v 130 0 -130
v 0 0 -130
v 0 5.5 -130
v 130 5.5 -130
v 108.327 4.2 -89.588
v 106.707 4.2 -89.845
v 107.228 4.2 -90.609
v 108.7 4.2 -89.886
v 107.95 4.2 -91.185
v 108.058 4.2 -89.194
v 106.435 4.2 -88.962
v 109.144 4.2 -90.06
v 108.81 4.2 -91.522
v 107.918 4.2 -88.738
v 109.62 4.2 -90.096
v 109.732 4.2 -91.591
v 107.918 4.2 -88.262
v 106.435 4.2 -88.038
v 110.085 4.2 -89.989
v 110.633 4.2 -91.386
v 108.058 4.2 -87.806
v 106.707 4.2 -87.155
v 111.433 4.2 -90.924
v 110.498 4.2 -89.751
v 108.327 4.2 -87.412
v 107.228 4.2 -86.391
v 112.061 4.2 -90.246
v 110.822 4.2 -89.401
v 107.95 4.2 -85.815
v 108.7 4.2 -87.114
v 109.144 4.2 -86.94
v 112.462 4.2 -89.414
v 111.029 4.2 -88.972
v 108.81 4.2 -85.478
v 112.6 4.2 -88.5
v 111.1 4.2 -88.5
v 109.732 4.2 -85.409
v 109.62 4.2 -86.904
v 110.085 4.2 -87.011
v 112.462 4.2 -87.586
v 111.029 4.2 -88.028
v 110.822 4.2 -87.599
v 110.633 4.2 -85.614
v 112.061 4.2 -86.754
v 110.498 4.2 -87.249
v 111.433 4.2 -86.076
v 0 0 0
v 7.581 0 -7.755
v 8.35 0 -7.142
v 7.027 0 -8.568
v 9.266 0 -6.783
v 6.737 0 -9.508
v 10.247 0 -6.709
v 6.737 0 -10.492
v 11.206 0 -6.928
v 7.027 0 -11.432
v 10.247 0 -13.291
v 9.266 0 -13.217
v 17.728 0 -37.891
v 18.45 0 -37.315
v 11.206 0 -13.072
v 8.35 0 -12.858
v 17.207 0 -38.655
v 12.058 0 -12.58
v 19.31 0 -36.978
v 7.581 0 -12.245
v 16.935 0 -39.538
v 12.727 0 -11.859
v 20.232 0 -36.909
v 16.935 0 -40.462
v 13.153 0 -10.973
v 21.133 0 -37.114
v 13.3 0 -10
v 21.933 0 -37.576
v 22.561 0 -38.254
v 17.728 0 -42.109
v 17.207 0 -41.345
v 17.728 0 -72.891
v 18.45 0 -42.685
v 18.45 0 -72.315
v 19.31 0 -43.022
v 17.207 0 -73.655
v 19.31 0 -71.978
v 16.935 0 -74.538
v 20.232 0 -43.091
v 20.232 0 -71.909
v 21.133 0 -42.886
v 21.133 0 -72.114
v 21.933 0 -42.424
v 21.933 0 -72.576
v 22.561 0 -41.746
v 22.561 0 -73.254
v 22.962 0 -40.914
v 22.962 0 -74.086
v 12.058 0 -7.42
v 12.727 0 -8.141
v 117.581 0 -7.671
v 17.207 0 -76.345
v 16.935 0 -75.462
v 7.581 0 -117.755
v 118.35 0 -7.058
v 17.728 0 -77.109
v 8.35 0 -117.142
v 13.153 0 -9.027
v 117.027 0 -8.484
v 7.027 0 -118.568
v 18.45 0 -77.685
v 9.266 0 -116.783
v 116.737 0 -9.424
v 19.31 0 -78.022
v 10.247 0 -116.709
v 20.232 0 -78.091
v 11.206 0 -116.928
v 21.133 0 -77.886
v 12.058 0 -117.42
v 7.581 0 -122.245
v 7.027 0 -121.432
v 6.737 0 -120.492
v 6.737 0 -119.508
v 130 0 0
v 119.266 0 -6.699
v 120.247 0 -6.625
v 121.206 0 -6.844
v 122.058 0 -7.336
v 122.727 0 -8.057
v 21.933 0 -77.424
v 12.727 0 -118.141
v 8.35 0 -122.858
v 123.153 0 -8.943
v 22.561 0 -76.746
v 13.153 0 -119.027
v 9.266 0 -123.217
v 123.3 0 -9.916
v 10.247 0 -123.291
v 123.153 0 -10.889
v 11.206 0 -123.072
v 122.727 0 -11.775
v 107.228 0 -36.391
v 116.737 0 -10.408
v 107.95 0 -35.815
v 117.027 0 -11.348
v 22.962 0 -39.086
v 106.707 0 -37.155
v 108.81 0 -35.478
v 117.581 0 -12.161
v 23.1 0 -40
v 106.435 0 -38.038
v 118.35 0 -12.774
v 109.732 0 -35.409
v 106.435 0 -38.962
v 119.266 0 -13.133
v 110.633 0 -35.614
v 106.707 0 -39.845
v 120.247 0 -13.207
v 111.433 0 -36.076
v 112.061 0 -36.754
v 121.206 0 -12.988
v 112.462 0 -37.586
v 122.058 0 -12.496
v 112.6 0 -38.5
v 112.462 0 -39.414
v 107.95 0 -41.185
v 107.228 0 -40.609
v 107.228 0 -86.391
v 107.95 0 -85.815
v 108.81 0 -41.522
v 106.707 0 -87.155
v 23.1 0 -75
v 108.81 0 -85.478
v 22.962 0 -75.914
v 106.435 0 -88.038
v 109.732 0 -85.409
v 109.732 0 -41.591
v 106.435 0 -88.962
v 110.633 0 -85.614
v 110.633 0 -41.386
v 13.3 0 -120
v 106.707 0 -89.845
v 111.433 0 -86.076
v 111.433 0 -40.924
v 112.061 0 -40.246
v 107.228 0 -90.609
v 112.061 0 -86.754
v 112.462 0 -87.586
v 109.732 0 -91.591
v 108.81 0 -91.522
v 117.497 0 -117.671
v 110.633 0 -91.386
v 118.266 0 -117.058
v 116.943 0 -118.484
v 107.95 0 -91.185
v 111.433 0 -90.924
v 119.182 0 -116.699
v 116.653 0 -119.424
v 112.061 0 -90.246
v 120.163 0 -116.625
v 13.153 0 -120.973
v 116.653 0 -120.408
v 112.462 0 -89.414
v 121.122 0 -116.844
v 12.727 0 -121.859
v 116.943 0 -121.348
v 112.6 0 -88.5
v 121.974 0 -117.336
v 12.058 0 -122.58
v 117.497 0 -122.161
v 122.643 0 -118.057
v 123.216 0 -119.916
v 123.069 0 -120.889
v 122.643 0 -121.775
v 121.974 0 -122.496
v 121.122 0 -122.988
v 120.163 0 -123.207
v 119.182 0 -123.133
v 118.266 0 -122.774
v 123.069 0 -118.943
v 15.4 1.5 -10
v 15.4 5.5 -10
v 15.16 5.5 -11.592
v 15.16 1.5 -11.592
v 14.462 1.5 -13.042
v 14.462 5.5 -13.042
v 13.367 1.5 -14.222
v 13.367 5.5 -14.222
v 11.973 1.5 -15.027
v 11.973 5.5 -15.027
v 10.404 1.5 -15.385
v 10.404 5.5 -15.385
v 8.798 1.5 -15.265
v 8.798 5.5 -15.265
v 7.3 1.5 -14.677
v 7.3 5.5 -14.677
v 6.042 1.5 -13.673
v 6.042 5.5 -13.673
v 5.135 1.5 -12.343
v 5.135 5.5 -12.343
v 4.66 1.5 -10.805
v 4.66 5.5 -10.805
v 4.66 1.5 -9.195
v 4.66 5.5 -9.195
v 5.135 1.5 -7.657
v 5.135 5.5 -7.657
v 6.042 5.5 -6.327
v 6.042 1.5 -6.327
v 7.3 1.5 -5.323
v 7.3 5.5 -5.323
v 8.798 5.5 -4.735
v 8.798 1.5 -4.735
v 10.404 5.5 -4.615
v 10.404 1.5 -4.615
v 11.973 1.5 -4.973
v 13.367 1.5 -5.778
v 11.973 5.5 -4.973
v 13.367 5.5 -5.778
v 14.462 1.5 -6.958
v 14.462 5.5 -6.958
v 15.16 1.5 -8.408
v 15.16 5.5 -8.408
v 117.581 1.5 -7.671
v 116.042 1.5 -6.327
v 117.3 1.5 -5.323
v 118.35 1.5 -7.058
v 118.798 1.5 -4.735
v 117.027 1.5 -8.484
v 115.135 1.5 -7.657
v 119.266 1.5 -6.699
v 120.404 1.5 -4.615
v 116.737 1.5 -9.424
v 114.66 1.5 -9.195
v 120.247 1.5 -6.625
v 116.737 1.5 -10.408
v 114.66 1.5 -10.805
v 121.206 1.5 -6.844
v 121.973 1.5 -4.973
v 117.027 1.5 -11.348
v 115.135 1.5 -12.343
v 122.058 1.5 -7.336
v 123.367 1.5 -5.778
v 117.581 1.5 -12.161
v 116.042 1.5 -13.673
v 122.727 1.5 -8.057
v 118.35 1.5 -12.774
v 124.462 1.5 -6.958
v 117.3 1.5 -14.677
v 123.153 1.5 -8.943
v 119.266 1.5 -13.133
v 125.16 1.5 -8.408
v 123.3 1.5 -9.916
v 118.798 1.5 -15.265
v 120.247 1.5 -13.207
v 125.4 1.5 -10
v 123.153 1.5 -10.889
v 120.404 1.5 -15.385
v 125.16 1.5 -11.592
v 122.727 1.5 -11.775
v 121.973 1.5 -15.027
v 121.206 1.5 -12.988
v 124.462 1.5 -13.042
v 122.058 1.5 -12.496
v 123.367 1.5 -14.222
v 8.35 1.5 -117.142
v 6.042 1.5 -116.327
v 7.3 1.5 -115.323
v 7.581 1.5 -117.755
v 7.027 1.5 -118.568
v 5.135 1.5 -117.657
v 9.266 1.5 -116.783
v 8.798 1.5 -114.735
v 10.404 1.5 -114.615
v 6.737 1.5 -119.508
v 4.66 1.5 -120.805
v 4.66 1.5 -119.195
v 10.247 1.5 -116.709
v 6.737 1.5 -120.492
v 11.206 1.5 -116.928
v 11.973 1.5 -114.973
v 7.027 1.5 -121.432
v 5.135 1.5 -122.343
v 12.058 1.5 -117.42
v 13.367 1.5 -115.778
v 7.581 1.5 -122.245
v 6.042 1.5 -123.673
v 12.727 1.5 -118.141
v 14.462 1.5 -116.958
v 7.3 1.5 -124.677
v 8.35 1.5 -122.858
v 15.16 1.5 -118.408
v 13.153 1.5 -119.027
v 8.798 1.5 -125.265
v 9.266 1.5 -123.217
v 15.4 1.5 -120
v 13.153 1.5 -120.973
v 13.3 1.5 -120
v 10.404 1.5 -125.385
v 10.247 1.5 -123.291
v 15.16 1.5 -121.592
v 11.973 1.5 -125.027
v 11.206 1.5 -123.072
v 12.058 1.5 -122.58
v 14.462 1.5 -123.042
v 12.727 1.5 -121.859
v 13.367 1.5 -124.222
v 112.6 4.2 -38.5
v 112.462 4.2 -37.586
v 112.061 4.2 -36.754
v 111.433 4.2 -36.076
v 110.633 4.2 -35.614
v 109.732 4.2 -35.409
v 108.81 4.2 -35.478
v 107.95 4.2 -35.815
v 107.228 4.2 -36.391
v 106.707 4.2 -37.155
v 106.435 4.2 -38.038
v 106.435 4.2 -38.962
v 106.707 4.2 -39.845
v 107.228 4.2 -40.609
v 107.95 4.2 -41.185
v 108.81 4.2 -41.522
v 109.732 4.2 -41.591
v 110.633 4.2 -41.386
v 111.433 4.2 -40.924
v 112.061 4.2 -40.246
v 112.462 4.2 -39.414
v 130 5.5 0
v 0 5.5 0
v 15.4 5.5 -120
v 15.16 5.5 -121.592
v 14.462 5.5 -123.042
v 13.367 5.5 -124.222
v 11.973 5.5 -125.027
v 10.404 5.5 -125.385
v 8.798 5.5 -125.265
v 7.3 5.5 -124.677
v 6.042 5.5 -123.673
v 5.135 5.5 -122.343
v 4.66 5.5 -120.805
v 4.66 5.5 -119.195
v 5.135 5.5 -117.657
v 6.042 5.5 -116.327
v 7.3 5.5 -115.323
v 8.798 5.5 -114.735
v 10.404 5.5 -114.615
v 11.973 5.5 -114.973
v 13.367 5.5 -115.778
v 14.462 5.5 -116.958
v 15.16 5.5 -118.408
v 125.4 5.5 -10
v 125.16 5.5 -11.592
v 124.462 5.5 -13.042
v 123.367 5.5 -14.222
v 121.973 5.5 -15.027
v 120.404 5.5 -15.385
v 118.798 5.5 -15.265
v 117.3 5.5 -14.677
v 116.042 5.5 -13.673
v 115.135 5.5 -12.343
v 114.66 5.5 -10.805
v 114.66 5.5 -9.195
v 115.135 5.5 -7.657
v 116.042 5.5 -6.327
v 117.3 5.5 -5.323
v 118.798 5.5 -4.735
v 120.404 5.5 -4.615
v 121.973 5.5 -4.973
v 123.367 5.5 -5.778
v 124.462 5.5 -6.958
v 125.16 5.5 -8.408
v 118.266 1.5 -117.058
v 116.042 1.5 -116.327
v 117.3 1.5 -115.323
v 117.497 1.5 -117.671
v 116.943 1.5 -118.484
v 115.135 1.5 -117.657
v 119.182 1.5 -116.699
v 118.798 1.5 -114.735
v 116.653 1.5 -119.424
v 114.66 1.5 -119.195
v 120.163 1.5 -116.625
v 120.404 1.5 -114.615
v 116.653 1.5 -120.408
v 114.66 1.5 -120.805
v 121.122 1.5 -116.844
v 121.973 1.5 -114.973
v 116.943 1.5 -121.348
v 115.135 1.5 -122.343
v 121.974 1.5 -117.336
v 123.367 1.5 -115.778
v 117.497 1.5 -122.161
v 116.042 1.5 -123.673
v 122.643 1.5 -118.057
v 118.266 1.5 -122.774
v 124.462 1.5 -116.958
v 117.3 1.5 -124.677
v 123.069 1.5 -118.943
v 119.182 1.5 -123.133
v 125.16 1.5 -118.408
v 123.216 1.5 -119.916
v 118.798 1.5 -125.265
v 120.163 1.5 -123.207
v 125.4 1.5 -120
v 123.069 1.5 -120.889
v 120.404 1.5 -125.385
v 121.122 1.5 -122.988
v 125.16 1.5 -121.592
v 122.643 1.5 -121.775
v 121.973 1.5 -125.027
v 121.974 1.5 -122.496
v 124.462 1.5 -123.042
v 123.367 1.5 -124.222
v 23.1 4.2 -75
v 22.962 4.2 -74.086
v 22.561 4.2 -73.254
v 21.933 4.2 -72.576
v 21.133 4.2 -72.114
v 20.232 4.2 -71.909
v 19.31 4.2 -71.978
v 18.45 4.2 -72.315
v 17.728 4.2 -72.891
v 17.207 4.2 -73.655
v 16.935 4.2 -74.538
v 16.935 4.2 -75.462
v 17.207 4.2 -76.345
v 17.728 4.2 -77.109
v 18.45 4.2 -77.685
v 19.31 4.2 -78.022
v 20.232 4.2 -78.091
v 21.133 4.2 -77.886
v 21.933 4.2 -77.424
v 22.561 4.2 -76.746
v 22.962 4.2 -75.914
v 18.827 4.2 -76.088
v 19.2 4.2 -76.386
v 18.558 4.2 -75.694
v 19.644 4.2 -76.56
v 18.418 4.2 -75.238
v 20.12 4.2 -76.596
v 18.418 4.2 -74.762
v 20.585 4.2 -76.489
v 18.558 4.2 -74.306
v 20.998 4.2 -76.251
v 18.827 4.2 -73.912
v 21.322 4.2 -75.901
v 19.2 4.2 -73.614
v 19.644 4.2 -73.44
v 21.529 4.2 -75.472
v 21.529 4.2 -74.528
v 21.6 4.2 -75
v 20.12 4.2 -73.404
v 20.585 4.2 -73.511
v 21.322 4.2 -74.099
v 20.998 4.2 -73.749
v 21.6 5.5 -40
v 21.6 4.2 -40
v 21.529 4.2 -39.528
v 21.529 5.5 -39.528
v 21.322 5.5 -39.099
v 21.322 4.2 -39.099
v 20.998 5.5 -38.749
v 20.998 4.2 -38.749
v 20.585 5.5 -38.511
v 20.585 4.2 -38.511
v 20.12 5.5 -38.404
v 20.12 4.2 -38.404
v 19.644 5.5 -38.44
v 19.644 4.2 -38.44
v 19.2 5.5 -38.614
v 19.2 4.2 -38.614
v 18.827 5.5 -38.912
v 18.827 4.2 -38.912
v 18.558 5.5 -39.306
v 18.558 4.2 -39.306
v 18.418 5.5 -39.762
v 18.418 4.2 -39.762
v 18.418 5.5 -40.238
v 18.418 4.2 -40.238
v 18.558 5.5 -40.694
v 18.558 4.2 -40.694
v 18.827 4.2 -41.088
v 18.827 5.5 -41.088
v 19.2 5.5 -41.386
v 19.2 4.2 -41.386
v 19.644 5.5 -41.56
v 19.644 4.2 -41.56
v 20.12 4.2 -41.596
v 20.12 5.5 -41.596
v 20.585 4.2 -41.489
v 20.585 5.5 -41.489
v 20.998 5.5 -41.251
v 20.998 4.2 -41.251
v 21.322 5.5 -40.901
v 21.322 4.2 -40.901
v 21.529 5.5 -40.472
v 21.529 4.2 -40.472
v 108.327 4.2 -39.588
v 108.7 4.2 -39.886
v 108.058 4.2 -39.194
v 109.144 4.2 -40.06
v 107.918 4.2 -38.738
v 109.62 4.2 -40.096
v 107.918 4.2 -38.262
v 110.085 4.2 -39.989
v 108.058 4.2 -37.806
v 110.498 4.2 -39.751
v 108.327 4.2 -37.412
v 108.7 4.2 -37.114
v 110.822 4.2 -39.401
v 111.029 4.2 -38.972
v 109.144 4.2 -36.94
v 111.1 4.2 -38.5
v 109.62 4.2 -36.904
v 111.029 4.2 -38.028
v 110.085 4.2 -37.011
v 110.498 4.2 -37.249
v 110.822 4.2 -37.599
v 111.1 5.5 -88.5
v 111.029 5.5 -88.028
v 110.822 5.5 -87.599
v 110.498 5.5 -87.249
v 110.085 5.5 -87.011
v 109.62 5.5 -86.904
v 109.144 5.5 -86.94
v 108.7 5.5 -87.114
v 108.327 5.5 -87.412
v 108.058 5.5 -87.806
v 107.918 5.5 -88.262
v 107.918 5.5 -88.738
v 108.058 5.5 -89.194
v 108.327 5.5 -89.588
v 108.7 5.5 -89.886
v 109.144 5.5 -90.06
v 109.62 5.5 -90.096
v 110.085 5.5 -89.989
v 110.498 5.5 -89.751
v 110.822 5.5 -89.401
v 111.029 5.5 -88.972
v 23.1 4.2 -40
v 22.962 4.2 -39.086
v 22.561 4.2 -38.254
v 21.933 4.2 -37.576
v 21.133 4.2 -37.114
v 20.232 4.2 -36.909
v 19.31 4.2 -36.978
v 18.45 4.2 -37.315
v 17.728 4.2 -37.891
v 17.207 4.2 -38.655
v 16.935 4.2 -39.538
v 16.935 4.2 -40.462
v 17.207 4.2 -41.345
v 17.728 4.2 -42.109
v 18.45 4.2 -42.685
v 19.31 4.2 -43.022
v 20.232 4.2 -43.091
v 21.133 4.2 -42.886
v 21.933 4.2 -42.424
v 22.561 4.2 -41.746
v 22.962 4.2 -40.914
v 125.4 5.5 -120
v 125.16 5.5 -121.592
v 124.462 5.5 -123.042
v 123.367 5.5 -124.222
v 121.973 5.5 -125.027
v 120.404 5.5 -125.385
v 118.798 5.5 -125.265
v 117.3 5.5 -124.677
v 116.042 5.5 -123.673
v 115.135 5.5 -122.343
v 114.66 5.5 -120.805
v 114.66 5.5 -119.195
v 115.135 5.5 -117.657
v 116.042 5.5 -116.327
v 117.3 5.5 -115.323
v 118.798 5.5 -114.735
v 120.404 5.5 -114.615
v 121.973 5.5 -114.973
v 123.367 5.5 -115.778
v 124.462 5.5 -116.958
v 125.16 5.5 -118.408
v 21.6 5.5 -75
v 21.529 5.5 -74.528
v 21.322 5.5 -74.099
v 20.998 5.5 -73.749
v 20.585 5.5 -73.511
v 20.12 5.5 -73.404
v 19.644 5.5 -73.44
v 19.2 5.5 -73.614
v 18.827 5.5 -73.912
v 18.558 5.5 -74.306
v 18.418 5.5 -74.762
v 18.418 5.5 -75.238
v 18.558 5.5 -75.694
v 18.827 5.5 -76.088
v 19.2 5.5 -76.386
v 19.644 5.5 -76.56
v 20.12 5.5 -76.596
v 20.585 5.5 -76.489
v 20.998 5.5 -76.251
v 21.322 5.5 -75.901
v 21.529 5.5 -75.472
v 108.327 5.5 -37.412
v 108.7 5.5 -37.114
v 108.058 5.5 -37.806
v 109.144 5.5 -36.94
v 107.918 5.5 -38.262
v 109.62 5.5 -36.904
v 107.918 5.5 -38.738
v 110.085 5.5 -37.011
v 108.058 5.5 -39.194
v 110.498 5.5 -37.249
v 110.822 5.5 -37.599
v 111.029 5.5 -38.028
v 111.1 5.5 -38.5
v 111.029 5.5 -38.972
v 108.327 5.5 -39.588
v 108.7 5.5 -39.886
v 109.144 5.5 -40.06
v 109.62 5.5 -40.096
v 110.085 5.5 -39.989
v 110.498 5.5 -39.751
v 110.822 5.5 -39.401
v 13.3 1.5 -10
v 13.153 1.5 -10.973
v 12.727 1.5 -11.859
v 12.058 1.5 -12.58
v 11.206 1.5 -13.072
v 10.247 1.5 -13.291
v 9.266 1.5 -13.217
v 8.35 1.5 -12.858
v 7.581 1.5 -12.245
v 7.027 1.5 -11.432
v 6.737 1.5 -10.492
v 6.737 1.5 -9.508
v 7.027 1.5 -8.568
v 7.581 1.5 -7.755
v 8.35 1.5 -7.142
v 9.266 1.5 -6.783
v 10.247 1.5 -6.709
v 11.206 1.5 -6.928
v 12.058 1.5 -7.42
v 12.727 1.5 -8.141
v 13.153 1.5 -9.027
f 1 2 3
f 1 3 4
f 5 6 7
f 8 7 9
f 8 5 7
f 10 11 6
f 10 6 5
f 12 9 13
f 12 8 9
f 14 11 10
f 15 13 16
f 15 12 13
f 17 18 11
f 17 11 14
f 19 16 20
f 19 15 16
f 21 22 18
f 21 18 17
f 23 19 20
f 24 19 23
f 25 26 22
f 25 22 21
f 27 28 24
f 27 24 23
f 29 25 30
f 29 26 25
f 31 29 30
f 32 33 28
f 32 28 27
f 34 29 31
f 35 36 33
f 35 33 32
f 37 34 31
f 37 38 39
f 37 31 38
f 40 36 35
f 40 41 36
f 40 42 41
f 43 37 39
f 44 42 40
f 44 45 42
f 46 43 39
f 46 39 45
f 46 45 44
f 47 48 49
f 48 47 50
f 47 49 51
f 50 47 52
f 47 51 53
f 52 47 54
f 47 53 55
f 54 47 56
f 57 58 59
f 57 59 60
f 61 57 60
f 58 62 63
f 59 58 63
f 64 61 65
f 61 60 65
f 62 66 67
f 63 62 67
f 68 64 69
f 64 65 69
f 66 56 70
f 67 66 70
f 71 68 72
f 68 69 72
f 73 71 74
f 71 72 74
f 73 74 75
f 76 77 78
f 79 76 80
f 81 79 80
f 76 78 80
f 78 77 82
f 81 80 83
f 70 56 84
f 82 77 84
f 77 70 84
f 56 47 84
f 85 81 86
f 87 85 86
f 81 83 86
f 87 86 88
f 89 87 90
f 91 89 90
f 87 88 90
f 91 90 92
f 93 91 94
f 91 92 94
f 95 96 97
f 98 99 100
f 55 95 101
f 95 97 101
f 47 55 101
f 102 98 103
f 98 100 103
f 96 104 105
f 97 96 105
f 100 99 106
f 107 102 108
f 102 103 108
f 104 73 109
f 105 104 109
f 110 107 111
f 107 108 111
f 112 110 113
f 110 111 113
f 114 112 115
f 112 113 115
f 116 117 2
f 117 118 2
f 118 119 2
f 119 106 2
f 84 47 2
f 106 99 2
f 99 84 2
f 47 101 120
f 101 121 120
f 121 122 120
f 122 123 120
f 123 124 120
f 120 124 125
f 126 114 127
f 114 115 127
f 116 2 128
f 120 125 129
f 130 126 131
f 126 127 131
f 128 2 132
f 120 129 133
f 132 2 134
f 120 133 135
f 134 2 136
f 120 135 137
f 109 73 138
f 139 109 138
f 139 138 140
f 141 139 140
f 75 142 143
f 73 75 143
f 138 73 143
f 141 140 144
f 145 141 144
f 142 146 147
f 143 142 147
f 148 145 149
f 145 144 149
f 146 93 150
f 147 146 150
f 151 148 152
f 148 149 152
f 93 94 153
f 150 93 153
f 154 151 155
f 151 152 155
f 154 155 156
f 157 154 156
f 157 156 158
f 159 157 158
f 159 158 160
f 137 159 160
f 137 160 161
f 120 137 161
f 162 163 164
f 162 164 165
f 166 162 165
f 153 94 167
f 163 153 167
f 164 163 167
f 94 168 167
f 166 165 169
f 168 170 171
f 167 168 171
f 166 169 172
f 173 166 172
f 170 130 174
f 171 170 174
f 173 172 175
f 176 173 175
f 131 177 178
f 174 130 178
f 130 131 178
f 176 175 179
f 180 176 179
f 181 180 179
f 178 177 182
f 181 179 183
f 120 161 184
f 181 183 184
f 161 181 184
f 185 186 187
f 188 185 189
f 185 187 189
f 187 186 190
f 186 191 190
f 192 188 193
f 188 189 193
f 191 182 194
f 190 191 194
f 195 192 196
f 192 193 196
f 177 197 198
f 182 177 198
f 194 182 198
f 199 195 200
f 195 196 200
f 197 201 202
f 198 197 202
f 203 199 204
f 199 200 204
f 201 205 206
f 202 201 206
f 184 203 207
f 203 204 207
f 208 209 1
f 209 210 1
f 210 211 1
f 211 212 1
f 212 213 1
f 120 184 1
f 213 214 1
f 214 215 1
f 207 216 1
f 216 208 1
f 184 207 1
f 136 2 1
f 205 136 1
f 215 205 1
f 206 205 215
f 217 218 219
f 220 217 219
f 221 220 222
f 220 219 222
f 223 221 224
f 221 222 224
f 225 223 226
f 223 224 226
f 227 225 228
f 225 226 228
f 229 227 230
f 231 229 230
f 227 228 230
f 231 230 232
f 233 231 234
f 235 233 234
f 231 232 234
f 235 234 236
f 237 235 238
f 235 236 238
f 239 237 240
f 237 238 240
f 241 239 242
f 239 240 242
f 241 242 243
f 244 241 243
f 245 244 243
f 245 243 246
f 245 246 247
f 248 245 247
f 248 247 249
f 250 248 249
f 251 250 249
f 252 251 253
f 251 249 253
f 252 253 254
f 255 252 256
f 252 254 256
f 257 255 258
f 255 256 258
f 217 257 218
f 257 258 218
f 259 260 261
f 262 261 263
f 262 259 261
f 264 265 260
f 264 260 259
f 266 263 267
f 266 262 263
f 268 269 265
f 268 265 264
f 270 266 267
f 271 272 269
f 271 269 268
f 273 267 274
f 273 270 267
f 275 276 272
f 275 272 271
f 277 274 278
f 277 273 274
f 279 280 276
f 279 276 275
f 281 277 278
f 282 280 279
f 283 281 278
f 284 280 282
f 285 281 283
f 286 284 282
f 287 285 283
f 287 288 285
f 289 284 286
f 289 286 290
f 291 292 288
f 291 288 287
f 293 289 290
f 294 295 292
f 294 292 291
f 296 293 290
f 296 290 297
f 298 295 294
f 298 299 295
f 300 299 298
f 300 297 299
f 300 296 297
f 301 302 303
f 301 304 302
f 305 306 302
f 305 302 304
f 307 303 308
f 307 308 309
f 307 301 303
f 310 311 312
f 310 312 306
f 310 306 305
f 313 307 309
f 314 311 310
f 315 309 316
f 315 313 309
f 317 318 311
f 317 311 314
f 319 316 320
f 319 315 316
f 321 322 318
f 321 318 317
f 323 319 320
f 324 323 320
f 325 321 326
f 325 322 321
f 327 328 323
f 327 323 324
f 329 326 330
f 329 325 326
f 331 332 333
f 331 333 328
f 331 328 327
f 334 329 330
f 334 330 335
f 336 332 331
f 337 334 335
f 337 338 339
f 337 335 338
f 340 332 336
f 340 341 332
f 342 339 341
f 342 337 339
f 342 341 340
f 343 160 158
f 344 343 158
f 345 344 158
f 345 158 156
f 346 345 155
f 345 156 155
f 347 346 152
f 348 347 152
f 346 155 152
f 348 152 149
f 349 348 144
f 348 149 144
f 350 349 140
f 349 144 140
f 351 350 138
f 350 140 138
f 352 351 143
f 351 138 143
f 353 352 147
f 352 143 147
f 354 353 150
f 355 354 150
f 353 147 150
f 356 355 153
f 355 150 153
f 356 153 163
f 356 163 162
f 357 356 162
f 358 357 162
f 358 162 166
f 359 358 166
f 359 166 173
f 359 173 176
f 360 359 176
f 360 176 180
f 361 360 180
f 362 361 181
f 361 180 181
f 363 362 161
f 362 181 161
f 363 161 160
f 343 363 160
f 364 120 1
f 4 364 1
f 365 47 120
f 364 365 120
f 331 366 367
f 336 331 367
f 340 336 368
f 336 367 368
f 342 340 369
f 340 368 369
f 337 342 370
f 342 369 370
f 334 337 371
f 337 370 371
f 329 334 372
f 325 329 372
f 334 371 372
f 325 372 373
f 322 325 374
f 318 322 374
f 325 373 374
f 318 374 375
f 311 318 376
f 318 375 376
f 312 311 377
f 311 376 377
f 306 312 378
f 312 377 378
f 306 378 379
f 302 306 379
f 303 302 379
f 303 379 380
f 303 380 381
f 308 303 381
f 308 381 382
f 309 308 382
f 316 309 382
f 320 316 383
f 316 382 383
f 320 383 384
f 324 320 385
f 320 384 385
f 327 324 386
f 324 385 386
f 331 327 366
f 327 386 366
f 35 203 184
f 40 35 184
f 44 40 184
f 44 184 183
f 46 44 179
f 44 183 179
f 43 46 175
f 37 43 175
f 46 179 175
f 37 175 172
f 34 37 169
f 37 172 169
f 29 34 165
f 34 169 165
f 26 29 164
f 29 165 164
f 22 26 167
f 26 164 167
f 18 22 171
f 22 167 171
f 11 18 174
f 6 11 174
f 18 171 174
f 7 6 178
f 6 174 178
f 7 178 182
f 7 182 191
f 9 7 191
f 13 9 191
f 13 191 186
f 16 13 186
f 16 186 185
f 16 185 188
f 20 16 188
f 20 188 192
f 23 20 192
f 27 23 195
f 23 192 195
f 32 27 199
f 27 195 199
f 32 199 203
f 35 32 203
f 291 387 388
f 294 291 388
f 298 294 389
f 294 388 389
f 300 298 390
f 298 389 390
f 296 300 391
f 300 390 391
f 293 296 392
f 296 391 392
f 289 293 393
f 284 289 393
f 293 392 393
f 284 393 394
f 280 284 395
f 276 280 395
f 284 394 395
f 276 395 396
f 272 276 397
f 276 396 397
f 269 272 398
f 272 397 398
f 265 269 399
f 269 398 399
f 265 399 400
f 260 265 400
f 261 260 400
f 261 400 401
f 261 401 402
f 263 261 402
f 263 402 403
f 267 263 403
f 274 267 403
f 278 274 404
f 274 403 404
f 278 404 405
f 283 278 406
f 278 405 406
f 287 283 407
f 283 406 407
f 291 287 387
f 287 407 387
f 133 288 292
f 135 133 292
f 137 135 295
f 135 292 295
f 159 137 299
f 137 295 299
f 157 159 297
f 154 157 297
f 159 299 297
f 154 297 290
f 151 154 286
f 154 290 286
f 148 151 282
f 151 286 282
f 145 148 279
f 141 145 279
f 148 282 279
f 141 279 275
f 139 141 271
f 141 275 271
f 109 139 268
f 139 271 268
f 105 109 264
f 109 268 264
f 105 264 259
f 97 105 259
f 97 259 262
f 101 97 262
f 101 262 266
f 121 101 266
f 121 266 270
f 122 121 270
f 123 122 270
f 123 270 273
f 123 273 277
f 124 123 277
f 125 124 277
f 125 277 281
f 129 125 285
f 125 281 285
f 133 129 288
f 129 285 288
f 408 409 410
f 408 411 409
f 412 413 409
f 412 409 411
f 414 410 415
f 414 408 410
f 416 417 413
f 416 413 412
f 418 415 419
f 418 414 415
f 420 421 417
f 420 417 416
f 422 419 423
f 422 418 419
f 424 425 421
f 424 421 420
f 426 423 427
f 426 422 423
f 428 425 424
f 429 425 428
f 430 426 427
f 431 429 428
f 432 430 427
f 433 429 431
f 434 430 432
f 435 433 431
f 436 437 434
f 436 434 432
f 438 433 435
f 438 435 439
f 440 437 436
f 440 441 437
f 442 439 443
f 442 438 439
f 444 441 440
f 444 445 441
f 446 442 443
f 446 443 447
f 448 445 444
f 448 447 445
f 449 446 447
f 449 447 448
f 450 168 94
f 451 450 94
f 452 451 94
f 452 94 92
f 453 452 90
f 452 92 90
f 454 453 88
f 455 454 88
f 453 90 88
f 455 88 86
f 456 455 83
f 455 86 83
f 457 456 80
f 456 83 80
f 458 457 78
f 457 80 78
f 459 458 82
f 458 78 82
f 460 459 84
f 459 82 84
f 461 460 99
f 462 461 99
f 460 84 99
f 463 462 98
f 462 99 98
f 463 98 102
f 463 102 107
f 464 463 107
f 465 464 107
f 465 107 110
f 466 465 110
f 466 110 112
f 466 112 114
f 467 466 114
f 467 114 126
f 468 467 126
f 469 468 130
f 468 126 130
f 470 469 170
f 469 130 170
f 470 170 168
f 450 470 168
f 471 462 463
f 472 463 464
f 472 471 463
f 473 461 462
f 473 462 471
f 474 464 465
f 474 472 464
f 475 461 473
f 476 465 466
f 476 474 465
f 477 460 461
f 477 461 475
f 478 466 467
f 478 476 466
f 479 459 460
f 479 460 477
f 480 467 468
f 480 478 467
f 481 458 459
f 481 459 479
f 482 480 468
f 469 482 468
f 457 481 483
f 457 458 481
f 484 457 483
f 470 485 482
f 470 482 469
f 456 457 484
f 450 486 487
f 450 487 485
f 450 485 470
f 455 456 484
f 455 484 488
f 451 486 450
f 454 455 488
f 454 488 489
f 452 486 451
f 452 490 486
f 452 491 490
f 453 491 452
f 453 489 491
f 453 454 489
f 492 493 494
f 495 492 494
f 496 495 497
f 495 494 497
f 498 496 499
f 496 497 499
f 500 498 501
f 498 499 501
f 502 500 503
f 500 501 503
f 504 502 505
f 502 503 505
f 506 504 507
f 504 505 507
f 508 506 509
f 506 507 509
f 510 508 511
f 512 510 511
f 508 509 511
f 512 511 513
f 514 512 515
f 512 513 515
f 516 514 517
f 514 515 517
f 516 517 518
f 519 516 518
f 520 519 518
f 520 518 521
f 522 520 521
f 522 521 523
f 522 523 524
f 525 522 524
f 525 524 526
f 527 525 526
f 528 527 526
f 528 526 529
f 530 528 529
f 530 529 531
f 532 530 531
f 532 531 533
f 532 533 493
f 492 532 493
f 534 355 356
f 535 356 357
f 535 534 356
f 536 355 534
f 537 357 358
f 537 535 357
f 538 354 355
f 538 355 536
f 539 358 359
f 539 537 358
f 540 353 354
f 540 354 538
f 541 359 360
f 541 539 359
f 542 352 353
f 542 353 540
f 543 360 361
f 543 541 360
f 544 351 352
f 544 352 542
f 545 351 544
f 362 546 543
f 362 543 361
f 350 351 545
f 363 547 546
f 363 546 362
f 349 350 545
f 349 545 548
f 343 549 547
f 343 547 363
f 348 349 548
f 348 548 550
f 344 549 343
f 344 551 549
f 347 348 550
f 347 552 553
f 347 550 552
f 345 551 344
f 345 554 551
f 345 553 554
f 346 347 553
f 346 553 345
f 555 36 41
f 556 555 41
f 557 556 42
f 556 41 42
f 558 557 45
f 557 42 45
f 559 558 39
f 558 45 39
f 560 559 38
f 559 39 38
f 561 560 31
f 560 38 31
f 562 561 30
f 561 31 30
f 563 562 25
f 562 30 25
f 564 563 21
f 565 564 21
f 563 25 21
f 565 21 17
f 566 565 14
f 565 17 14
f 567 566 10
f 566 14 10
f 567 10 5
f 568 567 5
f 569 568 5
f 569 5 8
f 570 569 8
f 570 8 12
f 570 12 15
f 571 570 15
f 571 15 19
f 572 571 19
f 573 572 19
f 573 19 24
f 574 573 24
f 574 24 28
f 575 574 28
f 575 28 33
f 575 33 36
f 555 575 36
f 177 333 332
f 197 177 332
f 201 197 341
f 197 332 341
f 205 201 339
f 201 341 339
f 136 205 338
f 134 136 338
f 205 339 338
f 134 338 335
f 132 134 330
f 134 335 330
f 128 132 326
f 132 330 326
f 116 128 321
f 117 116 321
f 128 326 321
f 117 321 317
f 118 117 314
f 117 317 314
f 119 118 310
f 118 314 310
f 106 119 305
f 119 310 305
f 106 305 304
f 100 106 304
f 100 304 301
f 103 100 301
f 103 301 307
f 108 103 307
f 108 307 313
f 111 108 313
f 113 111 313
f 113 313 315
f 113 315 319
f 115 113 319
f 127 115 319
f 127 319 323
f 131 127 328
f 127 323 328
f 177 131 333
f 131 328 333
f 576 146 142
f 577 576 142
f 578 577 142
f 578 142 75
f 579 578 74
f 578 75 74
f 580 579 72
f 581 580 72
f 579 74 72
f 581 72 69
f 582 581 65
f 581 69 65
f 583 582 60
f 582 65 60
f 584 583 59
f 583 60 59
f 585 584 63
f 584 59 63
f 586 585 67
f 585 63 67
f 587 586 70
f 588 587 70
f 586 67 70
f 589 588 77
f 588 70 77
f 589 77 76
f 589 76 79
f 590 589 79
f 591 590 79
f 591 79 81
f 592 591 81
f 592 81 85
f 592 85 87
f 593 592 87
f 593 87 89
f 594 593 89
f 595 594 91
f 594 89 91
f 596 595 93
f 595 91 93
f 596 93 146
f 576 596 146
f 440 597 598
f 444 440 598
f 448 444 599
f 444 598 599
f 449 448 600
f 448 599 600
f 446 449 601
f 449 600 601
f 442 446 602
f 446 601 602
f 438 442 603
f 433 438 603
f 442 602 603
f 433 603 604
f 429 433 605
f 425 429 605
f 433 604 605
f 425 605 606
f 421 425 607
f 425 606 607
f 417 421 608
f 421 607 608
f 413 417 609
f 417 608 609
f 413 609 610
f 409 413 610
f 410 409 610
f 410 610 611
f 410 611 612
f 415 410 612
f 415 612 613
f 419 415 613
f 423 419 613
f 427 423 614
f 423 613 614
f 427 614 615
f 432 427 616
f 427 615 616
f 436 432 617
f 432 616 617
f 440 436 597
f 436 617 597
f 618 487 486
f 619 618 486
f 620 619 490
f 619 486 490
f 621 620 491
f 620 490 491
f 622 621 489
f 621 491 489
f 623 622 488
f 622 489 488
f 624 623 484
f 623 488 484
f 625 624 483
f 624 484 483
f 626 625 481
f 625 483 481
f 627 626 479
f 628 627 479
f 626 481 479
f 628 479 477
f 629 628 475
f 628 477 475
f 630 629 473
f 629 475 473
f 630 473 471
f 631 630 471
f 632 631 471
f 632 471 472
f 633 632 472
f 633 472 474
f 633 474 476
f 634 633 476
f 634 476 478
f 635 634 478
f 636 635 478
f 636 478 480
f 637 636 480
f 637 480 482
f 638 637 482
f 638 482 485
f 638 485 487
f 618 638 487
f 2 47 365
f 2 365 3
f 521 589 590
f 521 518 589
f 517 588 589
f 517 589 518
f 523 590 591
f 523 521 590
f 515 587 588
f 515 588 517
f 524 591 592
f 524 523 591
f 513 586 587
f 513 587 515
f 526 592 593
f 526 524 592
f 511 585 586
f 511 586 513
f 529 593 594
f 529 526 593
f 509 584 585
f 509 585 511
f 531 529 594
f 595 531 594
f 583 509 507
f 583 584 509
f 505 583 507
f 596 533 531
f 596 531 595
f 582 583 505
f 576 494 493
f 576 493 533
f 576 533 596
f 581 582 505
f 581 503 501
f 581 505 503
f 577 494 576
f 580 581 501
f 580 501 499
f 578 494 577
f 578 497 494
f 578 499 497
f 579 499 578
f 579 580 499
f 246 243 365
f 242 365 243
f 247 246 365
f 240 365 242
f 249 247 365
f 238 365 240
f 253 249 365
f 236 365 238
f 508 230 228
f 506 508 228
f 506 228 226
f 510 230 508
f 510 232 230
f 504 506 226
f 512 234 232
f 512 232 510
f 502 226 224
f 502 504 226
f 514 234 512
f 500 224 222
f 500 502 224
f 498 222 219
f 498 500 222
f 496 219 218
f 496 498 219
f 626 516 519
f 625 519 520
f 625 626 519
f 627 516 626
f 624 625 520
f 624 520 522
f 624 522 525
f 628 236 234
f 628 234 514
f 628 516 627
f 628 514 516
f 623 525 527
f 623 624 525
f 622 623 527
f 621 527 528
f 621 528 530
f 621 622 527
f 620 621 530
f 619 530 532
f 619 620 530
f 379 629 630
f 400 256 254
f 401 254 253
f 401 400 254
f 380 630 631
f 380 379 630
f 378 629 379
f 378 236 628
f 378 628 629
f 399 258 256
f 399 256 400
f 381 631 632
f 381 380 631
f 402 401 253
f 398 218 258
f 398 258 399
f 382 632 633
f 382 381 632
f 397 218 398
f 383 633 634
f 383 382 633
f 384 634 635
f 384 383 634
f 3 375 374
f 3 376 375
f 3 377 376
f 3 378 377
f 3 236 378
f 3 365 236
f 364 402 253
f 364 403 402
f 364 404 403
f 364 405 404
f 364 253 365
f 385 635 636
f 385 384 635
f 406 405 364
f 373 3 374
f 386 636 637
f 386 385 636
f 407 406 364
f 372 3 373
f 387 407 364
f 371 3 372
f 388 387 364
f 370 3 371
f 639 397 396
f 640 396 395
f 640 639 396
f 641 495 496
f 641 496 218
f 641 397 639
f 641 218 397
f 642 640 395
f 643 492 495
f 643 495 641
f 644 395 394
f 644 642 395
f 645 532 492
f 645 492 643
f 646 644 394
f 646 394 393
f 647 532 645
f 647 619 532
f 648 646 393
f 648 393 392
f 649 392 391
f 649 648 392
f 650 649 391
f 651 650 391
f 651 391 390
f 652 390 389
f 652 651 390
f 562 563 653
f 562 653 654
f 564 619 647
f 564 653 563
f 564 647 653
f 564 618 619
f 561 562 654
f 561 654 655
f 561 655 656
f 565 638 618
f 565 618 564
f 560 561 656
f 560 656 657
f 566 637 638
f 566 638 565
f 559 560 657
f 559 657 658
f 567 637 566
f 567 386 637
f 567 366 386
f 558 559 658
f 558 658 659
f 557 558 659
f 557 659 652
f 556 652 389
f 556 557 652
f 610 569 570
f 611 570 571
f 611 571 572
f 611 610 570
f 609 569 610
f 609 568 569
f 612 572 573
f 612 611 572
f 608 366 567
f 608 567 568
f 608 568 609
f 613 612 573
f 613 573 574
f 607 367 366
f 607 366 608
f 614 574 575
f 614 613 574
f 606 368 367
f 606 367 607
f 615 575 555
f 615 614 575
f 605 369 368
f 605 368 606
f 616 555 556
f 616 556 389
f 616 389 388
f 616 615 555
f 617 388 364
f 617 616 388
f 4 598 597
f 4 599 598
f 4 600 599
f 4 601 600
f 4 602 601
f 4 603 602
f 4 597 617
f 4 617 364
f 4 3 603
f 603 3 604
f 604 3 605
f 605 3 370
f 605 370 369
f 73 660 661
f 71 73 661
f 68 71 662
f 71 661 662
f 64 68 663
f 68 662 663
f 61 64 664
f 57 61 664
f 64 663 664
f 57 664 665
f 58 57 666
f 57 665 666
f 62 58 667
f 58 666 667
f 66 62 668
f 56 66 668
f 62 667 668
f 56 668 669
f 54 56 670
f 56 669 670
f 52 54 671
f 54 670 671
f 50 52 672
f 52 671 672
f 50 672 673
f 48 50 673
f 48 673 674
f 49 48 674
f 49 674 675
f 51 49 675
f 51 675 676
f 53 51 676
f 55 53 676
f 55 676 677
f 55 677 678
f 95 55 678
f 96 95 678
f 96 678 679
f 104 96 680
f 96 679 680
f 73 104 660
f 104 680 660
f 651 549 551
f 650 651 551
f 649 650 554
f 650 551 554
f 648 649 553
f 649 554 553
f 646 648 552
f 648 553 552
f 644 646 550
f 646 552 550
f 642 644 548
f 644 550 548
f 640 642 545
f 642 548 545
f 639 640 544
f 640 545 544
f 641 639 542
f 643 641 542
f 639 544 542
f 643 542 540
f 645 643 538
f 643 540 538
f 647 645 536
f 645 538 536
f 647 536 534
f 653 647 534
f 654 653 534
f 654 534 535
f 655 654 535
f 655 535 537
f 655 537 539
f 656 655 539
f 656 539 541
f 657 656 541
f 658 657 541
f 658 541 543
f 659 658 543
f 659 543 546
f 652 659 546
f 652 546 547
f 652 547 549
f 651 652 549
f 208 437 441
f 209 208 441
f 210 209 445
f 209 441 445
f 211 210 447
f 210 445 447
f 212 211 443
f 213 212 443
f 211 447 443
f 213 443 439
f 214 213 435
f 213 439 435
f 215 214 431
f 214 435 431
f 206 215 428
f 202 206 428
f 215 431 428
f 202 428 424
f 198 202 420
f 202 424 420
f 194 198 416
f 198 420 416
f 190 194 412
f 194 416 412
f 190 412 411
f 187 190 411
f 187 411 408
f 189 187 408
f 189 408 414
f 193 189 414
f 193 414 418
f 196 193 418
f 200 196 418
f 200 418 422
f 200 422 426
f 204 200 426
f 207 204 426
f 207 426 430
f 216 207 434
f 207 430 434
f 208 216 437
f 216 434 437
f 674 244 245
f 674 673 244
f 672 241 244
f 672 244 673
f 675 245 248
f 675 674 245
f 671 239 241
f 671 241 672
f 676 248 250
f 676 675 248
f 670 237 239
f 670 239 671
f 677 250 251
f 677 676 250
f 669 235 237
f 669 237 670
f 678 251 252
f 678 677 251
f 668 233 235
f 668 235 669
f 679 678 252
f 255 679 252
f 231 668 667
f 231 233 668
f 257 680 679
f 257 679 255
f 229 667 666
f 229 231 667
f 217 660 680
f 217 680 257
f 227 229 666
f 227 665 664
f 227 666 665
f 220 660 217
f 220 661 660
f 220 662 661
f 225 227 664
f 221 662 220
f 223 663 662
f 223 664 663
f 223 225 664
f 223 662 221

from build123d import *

# Parameters (mm, degrees)
SKETCH_1_W           = 130
SKETCH_1_H           = 130
EXTRUDE_1_DEPTH      = 5.5
SKETCH_4_R           = 5.4
CUT_EXTRUDE_7_DEPTH  = 4
SKETCH_6_R           = 3.3
CUT_EXTRUDE_8_DEPTH  = 1.5
SKETCH_7_R           = 3.1
CUT_EXTRUDE_9_DEPTH  = 4.2
SKETCH_8_R           = 1.6
CUT_EXTRUDE_10_DEPTH = 2.3


with BuildPart() as part:
    # 草图1 → 凸台-拉伸1 (new body)
    with BuildSketch(Plane(origin=(0, 0, 0), x_dir=(1, 0, 0), z_dir=(0, 1, 0))):
        with Locations((65, 65)):
            Rectangle(SKETCH_1_W, SKETCH_1_H)
    extrude(amount=EXTRUDE_1_DEPTH)

    # 草图4 → 切除-拉伸7 (cut)
    with BuildSketch(Plane(origin=(0, 5.5, 0), x_dir=(1, 0, 0), z_dir=(0, 1, 0))):
        with Locations((10, 120)):
            Circle(SKETCH_4_R)
        with Locations((120, 120)):
            Circle(SKETCH_4_R)
        with Locations((10, 10)):
            Circle(SKETCH_4_R)
        with Locations((120, 10)):
            Circle(SKETCH_4_R)
    extrude(amount=-CUT_EXTRUDE_7_DEPTH, mode=Mode.SUBTRACT)

    # 草图6 → 切除-拉伸8 (cut)
    with BuildSketch(Plane(origin=(0, 1.5, 0), x_dir=(1, 0, 0), z_dir=(0, 1, 0))):
        with Locations((10, 120)):
            Circle(SKETCH_6_R)
        with Locations((119.916006429, 119.916006429)):
            Circle(SKETCH_6_R)
        with Locations((10, 10)):
            Circle(SKETCH_6_R)
        with Locations((120, 9.916006429)):
            Circle(SKETCH_6_R)
    extrude(amount=-CUT_EXTRUDE_8_DEPTH, mode=Mode.SUBTRACT)

    # 草图7 → 切除-拉伸9 (cut)
    with BuildSketch(Plane.XZ):
        with Locations((20, -40)):
            Circle(SKETCH_7_R)
        with Locations((20, -75)):
            Circle(SKETCH_7_R)
        with Locations((109.5, -38.5)):
            Circle(SKETCH_7_R)
        with Locations((109.5, -88.5)):
            Circle(SKETCH_7_R)
    extrude(amount=-CUT_EXTRUDE_9_DEPTH, mode=Mode.SUBTRACT)

    # 草图8 → 切除-拉伸10 (cut, through all)
    with BuildSketch(Plane.XZ.offset(-4.2)):
        with Locations((20, -40)):
            Circle(SKETCH_8_R)
        with Locations((20, -75)):
            Circle(SKETCH_8_R)
        with Locations((109.5, -38.5)):
            Circle(SKETCH_8_R)
        with Locations((109.5, -88.5)):
            Circle(SKETCH_8_R)
    extrude(amount=-CUT_EXTRUDE_10_DEPTH, mode=Mode.SUBTRACT)


solid = part.part
